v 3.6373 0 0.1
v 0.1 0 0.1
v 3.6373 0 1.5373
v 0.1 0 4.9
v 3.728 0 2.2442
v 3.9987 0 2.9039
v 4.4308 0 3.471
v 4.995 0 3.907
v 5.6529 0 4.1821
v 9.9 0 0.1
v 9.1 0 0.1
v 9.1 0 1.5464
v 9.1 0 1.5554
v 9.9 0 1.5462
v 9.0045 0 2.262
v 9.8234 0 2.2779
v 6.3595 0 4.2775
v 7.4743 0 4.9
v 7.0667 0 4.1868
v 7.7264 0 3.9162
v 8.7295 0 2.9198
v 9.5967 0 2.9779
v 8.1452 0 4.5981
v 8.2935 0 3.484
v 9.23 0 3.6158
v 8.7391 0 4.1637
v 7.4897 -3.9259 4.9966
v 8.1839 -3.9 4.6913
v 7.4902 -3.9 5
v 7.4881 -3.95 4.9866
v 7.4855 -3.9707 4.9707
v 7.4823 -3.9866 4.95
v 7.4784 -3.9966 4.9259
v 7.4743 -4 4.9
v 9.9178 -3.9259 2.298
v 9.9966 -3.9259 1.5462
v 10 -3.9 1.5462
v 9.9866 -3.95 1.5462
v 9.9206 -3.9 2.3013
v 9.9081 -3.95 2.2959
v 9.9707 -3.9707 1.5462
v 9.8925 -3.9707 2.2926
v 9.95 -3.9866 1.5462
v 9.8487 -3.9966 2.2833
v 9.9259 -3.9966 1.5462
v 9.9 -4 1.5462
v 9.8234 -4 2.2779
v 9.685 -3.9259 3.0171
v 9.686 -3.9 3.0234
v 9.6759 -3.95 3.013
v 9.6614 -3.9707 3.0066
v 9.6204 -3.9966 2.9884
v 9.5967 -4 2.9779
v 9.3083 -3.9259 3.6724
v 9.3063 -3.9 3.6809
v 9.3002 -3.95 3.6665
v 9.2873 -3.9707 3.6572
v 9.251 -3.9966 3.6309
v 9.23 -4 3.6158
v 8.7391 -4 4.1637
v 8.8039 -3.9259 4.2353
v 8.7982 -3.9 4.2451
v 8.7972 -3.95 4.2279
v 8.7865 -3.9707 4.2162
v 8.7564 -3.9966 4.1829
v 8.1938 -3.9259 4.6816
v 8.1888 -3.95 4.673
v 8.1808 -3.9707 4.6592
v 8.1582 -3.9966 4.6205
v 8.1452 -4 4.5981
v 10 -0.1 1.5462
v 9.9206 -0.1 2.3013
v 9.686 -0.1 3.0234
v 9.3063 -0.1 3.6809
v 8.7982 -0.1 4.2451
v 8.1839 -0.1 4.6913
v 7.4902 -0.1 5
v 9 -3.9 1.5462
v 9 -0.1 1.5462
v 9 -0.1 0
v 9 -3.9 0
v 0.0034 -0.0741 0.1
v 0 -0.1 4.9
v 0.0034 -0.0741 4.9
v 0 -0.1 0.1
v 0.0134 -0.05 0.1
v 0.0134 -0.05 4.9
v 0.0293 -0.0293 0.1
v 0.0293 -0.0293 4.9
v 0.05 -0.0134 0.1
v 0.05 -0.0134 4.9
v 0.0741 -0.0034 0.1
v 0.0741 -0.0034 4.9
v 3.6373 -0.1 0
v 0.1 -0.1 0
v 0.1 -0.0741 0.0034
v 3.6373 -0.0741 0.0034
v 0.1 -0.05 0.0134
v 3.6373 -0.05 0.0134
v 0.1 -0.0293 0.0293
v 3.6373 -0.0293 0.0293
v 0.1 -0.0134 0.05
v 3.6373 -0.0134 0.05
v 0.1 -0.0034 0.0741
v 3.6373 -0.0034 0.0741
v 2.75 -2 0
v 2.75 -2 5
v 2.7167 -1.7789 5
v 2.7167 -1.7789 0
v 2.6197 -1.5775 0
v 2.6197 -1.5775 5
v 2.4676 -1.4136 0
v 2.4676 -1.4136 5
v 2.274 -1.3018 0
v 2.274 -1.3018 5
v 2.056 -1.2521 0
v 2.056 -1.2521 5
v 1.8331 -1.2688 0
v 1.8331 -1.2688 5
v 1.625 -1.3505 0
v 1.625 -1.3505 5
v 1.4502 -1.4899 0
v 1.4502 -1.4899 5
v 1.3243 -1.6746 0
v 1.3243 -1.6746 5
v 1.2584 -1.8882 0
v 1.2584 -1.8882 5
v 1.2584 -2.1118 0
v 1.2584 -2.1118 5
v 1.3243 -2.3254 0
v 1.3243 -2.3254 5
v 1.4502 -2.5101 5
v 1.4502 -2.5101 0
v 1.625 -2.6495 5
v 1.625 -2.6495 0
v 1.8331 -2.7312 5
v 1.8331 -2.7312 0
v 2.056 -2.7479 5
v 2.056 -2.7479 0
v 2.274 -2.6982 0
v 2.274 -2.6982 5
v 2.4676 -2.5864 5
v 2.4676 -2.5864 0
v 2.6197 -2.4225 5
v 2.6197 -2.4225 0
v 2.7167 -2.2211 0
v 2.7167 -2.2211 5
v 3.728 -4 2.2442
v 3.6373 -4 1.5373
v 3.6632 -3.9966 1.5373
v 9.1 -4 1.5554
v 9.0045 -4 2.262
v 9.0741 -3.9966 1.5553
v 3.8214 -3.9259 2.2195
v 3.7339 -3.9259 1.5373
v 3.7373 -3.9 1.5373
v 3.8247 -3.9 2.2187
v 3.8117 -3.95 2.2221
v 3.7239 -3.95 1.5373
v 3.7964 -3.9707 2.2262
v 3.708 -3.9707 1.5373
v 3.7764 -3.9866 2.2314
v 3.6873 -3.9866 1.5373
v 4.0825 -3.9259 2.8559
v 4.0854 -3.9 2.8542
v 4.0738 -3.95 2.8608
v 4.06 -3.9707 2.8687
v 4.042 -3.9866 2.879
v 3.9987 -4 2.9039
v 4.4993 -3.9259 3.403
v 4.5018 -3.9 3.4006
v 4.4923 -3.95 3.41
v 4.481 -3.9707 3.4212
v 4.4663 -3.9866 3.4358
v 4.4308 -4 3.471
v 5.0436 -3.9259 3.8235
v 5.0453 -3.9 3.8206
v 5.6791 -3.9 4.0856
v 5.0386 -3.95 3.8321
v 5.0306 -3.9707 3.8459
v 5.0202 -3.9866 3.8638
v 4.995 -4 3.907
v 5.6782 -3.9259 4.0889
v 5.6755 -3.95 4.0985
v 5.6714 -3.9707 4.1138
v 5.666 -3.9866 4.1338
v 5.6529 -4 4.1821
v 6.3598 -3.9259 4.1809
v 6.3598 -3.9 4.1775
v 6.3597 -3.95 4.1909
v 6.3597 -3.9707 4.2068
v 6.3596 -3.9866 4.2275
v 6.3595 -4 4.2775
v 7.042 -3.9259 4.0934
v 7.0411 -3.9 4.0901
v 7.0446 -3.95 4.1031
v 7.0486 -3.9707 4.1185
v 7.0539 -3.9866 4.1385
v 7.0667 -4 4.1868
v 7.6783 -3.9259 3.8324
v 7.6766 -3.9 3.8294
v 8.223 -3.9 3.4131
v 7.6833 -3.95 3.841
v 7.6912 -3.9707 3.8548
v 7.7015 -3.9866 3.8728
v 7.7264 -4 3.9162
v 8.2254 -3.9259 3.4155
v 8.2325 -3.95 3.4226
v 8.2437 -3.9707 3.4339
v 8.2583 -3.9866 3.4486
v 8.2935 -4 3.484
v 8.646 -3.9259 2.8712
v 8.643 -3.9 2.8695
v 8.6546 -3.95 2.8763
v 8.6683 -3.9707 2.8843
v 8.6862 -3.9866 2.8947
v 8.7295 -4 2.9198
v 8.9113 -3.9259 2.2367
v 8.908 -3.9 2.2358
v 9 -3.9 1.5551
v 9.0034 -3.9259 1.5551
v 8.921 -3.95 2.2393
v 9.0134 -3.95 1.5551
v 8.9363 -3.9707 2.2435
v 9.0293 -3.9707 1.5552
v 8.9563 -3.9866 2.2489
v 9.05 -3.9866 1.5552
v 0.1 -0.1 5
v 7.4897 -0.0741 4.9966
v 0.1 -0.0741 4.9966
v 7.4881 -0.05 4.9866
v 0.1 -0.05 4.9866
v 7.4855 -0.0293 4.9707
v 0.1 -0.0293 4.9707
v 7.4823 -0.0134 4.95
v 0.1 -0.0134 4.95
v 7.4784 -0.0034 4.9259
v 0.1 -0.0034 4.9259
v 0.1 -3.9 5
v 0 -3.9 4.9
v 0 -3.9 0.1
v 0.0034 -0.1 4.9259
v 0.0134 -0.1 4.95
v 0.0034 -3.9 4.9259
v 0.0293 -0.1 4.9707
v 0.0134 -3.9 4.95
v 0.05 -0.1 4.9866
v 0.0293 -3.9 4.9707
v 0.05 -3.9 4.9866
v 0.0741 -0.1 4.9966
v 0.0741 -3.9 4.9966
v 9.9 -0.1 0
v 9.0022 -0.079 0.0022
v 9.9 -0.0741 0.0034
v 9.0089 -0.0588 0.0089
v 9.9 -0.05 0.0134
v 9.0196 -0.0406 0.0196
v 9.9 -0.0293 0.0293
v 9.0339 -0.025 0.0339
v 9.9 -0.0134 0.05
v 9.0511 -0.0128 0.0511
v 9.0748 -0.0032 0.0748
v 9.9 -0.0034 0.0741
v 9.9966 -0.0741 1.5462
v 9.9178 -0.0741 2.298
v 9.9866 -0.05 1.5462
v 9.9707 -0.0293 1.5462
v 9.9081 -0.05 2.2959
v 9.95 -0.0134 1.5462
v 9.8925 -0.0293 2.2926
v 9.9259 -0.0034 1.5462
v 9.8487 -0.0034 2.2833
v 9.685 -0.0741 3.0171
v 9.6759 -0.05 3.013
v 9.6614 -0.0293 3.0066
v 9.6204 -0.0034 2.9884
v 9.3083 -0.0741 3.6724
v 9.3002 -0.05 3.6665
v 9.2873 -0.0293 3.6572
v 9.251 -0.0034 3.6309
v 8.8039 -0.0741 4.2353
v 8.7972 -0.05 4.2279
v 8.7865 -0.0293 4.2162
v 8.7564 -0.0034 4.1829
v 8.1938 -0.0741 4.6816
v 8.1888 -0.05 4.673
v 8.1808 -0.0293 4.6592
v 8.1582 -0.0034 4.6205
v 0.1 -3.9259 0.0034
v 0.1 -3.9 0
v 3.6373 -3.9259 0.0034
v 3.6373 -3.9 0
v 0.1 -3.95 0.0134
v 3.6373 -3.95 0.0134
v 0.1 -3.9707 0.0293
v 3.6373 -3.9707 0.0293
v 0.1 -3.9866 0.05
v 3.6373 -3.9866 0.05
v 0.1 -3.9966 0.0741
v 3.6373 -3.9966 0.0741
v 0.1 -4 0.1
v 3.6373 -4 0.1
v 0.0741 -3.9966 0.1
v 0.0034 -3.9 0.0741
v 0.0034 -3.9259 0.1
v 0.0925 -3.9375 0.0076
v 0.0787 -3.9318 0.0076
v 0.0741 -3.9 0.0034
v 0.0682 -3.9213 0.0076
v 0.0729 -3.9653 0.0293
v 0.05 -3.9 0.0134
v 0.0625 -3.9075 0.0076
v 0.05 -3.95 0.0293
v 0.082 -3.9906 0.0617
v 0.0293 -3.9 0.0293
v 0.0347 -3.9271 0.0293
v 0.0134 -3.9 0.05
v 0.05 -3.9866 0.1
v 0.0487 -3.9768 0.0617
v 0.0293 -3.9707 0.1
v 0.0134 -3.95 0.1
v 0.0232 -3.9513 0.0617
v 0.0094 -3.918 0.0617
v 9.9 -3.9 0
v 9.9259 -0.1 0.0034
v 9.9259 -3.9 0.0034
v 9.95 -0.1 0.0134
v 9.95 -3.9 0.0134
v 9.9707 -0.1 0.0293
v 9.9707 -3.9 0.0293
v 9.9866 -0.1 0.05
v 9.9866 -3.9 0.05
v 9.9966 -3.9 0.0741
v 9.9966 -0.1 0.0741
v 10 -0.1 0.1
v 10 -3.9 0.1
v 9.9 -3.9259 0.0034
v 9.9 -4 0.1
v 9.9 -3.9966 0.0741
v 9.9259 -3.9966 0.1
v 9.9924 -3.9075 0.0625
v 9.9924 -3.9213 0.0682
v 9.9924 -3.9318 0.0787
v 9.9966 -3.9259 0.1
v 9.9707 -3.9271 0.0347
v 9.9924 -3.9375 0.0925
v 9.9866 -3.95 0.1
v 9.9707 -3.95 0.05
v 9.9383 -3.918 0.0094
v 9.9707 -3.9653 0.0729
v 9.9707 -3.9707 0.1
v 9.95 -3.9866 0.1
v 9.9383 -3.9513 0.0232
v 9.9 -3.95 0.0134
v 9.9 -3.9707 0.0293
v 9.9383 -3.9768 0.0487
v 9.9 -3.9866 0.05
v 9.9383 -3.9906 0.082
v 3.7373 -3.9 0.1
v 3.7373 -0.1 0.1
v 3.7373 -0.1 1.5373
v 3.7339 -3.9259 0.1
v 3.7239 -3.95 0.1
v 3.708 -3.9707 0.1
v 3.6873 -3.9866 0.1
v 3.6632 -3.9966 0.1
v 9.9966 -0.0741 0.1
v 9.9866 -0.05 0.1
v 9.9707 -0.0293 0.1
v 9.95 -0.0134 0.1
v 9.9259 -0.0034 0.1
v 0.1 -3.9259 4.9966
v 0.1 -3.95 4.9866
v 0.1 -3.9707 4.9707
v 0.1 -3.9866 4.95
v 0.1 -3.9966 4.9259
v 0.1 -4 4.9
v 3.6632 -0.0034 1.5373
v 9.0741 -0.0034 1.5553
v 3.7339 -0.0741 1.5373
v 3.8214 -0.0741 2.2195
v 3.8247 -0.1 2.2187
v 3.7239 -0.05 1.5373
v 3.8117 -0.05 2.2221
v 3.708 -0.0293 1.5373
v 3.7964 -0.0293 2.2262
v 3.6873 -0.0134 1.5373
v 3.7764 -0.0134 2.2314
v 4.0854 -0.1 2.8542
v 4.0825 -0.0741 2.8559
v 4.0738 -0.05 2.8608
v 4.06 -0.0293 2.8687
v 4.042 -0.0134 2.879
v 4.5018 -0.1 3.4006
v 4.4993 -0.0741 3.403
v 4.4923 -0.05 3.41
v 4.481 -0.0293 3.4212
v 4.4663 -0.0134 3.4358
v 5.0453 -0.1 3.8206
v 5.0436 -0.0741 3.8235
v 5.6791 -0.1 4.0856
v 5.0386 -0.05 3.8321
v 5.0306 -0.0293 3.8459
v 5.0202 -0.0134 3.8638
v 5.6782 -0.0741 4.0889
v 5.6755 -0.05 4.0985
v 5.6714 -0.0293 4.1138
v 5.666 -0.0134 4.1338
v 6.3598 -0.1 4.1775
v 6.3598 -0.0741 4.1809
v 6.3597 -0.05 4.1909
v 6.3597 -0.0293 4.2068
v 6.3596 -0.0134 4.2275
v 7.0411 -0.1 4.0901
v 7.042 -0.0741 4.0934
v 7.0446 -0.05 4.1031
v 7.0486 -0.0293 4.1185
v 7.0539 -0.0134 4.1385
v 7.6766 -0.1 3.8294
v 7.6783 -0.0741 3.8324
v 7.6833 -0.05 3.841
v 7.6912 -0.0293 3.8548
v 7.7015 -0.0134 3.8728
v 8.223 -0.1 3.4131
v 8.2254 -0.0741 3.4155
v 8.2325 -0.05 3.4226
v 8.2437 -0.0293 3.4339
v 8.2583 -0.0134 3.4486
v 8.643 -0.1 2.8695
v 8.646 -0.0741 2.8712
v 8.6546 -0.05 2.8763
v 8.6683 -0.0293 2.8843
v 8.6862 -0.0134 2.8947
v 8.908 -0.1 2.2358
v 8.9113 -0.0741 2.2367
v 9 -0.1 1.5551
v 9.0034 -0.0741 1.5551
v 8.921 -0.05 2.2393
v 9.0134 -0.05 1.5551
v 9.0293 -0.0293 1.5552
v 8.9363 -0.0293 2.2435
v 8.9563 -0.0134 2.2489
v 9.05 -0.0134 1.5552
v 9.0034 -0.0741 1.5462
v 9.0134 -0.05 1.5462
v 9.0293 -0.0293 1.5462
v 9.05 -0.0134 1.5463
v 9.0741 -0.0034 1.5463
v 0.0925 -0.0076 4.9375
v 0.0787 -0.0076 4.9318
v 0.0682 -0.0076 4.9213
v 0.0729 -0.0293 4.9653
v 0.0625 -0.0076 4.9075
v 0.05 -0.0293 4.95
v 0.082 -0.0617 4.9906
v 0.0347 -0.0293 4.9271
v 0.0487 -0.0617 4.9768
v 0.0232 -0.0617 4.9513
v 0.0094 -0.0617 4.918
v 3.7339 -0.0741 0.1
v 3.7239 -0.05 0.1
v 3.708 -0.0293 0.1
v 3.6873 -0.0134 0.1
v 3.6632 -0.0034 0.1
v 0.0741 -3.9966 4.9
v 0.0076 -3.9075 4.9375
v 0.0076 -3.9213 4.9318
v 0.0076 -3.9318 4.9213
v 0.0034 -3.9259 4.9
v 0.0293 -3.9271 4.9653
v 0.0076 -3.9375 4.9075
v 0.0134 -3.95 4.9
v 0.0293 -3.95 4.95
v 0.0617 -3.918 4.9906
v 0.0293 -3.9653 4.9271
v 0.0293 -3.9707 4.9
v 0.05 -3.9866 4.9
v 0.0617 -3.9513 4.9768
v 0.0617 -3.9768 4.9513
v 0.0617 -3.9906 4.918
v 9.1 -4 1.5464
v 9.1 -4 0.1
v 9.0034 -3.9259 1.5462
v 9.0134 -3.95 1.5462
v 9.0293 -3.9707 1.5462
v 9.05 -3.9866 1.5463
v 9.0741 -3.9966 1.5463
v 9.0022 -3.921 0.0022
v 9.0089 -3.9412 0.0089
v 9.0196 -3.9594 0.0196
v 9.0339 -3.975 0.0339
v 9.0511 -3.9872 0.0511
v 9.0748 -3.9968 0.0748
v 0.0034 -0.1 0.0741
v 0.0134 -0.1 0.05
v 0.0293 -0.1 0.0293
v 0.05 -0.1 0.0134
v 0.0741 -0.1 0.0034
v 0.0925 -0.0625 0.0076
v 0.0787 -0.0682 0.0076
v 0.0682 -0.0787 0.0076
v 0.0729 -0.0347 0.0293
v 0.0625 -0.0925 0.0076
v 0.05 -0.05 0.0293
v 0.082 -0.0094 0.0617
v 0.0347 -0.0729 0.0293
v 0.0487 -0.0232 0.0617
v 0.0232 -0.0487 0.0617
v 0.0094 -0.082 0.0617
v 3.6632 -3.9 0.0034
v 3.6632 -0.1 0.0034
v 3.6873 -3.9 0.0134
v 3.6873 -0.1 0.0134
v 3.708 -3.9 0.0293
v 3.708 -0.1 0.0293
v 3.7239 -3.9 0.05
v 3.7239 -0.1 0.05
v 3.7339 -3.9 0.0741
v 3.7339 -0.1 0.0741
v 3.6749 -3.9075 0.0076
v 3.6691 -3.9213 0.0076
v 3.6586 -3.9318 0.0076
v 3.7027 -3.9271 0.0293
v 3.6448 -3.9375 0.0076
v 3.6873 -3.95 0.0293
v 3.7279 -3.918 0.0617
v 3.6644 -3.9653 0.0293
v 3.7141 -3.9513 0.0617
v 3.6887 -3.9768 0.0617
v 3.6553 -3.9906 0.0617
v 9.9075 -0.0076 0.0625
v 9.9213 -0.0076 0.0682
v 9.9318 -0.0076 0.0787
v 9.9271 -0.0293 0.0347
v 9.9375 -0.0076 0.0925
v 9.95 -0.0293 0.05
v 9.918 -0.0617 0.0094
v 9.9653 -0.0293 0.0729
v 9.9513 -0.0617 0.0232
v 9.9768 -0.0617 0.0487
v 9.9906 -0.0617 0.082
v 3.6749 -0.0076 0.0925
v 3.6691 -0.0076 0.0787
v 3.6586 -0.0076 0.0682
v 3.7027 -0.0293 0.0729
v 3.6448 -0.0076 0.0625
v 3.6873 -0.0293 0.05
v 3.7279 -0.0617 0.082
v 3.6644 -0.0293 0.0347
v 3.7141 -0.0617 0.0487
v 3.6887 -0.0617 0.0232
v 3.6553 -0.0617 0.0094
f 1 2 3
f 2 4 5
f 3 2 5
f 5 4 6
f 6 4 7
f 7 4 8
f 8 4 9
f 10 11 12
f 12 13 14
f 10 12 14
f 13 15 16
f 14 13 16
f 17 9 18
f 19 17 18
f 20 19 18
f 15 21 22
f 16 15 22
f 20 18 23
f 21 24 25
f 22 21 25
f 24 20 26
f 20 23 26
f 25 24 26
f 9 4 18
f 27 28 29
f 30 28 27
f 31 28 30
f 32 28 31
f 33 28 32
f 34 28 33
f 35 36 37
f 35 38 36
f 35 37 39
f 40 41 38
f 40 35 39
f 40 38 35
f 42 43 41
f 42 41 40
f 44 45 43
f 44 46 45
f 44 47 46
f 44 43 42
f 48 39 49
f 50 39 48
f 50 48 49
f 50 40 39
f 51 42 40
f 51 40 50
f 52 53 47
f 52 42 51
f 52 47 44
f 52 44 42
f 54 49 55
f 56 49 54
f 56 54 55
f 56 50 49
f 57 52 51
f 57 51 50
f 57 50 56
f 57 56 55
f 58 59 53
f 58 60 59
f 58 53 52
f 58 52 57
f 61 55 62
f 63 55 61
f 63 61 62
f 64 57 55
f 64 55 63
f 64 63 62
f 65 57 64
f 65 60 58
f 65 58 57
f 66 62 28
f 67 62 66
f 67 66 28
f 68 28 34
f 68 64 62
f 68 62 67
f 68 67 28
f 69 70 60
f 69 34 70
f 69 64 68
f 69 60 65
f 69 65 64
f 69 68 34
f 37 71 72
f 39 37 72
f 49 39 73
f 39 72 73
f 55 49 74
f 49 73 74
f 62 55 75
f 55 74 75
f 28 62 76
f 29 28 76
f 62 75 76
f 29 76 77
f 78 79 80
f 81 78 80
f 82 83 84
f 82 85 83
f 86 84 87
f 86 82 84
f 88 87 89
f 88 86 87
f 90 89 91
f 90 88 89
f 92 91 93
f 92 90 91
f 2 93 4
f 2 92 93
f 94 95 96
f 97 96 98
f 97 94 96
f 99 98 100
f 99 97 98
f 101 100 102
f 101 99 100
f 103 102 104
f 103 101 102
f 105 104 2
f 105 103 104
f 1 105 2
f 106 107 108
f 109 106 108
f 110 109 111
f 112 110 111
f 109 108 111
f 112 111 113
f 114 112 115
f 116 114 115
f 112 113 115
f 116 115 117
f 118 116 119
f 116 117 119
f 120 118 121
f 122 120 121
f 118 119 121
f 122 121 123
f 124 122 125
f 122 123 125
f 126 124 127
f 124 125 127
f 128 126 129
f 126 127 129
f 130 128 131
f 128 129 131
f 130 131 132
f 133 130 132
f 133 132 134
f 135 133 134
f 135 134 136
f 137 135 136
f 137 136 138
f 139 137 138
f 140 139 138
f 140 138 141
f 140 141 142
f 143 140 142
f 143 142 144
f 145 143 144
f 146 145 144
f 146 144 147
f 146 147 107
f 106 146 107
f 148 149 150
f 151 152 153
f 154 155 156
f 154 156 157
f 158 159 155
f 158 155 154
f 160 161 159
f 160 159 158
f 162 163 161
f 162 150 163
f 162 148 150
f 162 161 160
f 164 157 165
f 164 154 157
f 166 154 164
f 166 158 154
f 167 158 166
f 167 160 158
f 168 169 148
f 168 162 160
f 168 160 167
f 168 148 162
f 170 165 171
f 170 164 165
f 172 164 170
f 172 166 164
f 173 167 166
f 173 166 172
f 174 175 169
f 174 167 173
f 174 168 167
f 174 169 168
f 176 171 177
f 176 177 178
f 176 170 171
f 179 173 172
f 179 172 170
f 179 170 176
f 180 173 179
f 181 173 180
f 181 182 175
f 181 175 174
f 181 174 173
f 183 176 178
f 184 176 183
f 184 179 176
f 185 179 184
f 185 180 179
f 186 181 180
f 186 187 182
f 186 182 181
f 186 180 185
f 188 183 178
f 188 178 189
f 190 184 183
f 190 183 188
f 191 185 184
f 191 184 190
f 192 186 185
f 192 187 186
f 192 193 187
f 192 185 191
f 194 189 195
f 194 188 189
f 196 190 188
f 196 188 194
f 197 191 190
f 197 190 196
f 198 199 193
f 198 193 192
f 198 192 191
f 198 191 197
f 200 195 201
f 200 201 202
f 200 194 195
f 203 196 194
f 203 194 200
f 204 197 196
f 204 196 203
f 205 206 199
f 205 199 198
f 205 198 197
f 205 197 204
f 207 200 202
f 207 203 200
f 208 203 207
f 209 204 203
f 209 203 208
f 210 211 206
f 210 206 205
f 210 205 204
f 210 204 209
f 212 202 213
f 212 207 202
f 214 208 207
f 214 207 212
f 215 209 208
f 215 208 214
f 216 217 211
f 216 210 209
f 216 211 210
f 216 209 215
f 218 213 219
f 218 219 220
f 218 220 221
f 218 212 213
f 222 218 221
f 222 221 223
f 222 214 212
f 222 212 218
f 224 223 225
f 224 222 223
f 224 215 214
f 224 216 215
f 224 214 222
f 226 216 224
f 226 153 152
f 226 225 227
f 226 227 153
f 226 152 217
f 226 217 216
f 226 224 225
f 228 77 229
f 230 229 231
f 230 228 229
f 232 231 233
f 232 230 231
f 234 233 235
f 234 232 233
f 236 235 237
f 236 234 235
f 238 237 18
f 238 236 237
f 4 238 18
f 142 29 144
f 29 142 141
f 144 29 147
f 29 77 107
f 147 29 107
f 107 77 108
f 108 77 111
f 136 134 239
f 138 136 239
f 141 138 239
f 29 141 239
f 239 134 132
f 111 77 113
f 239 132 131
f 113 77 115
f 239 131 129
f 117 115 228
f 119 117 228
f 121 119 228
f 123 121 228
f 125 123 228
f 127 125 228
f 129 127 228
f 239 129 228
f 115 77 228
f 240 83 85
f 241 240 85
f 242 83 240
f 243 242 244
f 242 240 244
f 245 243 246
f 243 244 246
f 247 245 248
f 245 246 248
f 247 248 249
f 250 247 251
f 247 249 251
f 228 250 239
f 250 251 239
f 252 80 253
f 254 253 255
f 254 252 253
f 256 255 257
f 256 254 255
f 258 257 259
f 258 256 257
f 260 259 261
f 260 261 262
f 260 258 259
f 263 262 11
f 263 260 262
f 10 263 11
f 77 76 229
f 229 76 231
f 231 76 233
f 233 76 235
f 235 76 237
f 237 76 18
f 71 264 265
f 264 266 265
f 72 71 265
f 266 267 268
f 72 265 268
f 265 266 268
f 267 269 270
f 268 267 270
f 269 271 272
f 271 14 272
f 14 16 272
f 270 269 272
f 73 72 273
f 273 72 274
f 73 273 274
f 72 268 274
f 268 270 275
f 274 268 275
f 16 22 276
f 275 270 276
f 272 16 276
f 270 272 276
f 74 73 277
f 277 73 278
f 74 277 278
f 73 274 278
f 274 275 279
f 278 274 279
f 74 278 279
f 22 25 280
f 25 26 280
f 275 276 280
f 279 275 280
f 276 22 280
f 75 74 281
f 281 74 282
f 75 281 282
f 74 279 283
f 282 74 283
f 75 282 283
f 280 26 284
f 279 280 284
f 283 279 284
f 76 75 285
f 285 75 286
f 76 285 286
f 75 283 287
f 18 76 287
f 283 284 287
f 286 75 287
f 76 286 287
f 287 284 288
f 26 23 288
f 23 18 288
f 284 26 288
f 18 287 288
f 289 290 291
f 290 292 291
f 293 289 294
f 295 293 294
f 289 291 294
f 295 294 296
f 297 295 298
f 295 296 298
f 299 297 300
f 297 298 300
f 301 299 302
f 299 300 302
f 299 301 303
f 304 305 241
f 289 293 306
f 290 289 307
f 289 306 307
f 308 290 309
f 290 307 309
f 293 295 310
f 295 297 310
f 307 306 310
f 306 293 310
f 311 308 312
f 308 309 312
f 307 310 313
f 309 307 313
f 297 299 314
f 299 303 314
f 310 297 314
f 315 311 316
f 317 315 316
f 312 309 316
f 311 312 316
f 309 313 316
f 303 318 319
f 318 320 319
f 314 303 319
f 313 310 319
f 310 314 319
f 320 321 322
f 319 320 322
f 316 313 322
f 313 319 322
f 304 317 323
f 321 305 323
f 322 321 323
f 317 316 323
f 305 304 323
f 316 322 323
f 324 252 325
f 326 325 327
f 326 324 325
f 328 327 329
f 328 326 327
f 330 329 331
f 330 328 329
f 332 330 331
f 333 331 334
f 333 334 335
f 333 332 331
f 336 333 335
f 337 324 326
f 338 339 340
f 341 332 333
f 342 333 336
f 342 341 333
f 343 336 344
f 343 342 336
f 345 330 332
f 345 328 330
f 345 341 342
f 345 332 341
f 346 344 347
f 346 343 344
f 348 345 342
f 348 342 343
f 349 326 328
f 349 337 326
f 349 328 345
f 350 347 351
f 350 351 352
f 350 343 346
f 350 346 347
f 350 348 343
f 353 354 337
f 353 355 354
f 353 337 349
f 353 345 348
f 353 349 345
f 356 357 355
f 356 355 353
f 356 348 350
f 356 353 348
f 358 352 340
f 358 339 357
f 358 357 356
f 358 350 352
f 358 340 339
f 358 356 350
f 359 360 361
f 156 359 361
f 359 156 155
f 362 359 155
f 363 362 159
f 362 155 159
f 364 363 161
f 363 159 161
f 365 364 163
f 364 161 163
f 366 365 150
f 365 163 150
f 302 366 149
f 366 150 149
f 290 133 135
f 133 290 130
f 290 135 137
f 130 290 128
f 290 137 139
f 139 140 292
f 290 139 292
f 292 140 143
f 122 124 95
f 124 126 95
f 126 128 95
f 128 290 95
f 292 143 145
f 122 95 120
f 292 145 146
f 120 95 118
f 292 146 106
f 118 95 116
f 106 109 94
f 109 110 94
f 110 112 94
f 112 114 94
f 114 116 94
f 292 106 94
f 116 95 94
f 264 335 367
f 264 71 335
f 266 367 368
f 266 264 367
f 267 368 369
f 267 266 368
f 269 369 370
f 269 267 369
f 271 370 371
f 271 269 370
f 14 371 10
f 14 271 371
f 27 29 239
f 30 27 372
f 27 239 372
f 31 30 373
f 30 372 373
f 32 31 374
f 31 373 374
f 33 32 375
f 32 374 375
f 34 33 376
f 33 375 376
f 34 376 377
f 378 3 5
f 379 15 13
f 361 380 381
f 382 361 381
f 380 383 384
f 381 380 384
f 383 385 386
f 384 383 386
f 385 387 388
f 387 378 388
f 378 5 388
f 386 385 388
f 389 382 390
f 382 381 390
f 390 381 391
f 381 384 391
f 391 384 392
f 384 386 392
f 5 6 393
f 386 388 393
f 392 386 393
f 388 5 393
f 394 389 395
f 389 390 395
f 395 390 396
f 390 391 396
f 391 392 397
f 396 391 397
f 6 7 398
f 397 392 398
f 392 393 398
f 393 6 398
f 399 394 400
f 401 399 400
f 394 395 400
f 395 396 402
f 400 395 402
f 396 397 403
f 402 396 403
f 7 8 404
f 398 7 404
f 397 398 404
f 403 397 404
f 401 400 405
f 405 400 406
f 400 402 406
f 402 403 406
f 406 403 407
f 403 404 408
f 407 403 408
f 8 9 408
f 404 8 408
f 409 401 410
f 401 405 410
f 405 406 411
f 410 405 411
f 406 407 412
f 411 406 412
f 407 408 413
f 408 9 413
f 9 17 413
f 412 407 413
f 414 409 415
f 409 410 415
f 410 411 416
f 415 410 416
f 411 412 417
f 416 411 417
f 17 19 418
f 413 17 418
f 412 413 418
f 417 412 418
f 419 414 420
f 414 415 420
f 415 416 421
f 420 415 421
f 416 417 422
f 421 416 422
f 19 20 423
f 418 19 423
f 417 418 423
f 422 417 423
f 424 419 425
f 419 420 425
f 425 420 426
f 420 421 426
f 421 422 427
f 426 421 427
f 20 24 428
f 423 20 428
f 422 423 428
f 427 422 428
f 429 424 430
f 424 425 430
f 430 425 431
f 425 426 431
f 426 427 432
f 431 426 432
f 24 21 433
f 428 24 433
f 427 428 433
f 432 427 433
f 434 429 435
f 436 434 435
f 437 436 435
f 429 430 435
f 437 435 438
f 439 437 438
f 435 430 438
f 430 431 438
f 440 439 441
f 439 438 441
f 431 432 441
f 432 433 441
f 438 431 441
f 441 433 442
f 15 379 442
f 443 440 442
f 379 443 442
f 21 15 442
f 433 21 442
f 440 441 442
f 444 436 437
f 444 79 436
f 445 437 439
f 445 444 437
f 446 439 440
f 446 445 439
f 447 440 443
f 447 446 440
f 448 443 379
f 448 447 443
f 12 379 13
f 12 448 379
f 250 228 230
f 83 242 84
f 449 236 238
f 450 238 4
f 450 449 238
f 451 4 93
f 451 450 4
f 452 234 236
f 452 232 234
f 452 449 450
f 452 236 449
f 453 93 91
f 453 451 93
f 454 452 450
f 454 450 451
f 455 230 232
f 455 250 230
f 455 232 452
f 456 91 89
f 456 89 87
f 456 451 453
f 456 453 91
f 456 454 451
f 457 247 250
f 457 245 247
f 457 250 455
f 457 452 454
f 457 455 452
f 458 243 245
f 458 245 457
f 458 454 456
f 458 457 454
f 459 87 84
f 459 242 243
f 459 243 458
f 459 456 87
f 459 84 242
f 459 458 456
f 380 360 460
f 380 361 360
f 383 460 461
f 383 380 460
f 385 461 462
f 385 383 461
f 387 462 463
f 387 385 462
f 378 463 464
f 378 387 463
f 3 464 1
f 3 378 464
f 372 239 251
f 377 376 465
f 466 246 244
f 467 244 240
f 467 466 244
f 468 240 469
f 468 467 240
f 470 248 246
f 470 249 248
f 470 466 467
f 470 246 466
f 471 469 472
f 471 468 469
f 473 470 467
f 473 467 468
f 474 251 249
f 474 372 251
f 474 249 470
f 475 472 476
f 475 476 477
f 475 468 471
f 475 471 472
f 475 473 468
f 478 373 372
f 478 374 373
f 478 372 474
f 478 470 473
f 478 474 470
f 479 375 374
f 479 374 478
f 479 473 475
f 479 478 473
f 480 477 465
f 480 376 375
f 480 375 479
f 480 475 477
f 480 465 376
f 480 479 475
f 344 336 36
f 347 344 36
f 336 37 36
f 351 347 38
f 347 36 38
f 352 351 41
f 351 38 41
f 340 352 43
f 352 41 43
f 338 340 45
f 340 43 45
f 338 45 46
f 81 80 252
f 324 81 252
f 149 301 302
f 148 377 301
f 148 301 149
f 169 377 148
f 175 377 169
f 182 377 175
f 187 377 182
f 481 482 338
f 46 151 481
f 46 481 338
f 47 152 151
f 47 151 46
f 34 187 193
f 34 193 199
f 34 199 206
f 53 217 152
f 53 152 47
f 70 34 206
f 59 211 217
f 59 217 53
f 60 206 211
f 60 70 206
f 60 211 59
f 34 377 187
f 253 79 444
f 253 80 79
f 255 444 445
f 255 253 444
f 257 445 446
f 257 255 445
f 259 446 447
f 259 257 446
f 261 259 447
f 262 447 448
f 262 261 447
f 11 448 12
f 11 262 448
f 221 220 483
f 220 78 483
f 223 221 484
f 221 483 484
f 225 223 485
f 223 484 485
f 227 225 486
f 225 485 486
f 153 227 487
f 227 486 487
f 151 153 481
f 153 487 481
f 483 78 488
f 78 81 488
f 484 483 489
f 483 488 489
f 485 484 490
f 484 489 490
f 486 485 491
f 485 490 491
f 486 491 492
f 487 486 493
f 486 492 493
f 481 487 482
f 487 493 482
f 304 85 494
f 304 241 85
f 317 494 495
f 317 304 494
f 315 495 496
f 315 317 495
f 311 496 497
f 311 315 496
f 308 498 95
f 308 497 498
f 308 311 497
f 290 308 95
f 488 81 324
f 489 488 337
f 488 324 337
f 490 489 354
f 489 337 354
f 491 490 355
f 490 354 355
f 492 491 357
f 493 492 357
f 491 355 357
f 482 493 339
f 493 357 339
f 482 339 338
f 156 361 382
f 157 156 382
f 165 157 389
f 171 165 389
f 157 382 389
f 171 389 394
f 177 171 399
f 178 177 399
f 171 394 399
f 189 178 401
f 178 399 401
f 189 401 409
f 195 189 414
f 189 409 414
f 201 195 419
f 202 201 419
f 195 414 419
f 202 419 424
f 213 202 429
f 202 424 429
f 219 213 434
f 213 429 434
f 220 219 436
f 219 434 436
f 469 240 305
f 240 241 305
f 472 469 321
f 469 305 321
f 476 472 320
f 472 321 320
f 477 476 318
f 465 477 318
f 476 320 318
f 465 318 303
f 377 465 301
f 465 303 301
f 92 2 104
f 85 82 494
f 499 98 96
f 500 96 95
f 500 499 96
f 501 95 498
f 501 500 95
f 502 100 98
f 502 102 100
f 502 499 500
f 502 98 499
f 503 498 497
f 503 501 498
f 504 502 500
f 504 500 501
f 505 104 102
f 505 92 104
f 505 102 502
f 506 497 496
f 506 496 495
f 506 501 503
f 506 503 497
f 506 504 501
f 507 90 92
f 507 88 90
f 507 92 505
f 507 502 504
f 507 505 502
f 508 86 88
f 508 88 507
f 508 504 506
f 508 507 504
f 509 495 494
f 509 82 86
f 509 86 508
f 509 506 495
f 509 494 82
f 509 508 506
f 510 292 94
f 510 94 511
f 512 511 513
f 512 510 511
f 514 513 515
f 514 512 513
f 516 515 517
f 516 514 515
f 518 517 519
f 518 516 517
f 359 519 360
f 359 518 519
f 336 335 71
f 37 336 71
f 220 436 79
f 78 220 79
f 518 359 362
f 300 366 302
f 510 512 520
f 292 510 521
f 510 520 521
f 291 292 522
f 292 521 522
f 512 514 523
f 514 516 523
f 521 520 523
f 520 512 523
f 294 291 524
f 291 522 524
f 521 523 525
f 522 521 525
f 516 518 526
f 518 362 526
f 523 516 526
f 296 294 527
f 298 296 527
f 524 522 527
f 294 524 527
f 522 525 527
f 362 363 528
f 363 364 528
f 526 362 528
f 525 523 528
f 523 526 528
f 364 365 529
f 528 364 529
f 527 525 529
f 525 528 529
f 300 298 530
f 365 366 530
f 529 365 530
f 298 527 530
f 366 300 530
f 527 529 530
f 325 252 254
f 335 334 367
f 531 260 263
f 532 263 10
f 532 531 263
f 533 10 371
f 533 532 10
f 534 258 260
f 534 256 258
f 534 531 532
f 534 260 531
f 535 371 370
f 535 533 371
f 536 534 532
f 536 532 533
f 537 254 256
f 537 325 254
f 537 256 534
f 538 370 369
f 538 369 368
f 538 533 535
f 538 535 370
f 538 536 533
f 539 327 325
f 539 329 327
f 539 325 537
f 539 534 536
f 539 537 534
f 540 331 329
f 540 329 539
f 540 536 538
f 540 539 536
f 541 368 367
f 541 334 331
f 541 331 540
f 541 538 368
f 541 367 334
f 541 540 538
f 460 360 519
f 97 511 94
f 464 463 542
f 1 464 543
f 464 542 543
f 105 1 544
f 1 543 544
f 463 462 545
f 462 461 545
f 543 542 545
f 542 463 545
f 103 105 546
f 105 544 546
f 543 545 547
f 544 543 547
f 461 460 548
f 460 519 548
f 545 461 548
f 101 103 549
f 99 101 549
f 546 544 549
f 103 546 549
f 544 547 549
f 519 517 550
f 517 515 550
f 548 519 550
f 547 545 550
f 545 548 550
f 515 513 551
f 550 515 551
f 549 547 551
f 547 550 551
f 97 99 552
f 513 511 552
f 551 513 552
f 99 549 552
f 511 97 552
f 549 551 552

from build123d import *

# Parameters (mm, degrees)
F1_DEPTH = 4
F3_R     = 0.1
F2_R     = 0.75
F4_DEPTH = 25


# Not quite as in the source:
# - ends of sketch curves that miss each other by under 0.0002 mm in the source are joined


with BuildPart() as f1:
    # F0 (on Front) → F1 (new body)
    with BuildSketch(Plane.XZ):
        with BuildLine():
            Line((0, 5), (0, 0))
            Line((0, 0), (3.7373243831, 0))
            Line((3.7373243831, 0), (3.7373243831, 1.5373318456))
            ThreePointArc((3.7373243831, 1.5373318456), (6.3598005329, 4.1775164411), (8.9999850781, 1.5550552132))
            Line((8.9999850781, 1.5550552132), (9, 1.5461935545))
            Line((9, 1.5461935545), (9, 0))
            Line((9, 0), (9.6543736474, 0))
            ThreePointArc((9.6543736474, 0), (9.9125401886, 0.7540174245), (10, 1.5461935545))
            ThreePointArc((10, 1.5461935545), (9.3062869056, 3.680900869), (7.4901947663, 5))
            Line((7.4901947663, 5), (5.2471296168, 5))
            Line((5.2471296168, 5), (0, 5))
        make_face()
        with BuildLine():
            Line((10, 0), (10, 1.5461935545))
            ThreePointArc((10, 1.5461935545), (9.9125401886, 0.7540174245), (9.6543736474, 0))
            Line((9.6543736474, 0), (10, 0))
        make_face()
    extrude(amount=F1_DEPTH)

    # F3
    f3_edges = [f1.edges().sort_by_distance(p)[0] for p in [
        (3.745097, -4, 5),
        (0, -2, 5),
        (0, -4, 2.5),
        (6.359793, -4, 4.177516),
        (3.737324, -2, 0),
        (1.868662, -4, 0),
        (9.5, -4, 0),
        (10, -2, 0),
        (9.5, 0, 0),
        (10, 0, 0.773097),
        (10, -4, 0.773097),
        (3.737324, 0, 0.768666),
        (3.745097, 0, 5),
        (0, 0, 2.5),
        (1.868662, 0, 0),
        (0, -2, 0),
    ]]
    fillet(f3_edges, radius=F3_R)

    # F2 (on face) → F4 (cut)
    with BuildSketch(Plane.XY.offset(5)):
        with Locations((2, -2)):
            Circle(F2_R)
    extrude(amount=-F4_DEPTH, mode=Mode.SUBTRACT)


solid = f1.part
